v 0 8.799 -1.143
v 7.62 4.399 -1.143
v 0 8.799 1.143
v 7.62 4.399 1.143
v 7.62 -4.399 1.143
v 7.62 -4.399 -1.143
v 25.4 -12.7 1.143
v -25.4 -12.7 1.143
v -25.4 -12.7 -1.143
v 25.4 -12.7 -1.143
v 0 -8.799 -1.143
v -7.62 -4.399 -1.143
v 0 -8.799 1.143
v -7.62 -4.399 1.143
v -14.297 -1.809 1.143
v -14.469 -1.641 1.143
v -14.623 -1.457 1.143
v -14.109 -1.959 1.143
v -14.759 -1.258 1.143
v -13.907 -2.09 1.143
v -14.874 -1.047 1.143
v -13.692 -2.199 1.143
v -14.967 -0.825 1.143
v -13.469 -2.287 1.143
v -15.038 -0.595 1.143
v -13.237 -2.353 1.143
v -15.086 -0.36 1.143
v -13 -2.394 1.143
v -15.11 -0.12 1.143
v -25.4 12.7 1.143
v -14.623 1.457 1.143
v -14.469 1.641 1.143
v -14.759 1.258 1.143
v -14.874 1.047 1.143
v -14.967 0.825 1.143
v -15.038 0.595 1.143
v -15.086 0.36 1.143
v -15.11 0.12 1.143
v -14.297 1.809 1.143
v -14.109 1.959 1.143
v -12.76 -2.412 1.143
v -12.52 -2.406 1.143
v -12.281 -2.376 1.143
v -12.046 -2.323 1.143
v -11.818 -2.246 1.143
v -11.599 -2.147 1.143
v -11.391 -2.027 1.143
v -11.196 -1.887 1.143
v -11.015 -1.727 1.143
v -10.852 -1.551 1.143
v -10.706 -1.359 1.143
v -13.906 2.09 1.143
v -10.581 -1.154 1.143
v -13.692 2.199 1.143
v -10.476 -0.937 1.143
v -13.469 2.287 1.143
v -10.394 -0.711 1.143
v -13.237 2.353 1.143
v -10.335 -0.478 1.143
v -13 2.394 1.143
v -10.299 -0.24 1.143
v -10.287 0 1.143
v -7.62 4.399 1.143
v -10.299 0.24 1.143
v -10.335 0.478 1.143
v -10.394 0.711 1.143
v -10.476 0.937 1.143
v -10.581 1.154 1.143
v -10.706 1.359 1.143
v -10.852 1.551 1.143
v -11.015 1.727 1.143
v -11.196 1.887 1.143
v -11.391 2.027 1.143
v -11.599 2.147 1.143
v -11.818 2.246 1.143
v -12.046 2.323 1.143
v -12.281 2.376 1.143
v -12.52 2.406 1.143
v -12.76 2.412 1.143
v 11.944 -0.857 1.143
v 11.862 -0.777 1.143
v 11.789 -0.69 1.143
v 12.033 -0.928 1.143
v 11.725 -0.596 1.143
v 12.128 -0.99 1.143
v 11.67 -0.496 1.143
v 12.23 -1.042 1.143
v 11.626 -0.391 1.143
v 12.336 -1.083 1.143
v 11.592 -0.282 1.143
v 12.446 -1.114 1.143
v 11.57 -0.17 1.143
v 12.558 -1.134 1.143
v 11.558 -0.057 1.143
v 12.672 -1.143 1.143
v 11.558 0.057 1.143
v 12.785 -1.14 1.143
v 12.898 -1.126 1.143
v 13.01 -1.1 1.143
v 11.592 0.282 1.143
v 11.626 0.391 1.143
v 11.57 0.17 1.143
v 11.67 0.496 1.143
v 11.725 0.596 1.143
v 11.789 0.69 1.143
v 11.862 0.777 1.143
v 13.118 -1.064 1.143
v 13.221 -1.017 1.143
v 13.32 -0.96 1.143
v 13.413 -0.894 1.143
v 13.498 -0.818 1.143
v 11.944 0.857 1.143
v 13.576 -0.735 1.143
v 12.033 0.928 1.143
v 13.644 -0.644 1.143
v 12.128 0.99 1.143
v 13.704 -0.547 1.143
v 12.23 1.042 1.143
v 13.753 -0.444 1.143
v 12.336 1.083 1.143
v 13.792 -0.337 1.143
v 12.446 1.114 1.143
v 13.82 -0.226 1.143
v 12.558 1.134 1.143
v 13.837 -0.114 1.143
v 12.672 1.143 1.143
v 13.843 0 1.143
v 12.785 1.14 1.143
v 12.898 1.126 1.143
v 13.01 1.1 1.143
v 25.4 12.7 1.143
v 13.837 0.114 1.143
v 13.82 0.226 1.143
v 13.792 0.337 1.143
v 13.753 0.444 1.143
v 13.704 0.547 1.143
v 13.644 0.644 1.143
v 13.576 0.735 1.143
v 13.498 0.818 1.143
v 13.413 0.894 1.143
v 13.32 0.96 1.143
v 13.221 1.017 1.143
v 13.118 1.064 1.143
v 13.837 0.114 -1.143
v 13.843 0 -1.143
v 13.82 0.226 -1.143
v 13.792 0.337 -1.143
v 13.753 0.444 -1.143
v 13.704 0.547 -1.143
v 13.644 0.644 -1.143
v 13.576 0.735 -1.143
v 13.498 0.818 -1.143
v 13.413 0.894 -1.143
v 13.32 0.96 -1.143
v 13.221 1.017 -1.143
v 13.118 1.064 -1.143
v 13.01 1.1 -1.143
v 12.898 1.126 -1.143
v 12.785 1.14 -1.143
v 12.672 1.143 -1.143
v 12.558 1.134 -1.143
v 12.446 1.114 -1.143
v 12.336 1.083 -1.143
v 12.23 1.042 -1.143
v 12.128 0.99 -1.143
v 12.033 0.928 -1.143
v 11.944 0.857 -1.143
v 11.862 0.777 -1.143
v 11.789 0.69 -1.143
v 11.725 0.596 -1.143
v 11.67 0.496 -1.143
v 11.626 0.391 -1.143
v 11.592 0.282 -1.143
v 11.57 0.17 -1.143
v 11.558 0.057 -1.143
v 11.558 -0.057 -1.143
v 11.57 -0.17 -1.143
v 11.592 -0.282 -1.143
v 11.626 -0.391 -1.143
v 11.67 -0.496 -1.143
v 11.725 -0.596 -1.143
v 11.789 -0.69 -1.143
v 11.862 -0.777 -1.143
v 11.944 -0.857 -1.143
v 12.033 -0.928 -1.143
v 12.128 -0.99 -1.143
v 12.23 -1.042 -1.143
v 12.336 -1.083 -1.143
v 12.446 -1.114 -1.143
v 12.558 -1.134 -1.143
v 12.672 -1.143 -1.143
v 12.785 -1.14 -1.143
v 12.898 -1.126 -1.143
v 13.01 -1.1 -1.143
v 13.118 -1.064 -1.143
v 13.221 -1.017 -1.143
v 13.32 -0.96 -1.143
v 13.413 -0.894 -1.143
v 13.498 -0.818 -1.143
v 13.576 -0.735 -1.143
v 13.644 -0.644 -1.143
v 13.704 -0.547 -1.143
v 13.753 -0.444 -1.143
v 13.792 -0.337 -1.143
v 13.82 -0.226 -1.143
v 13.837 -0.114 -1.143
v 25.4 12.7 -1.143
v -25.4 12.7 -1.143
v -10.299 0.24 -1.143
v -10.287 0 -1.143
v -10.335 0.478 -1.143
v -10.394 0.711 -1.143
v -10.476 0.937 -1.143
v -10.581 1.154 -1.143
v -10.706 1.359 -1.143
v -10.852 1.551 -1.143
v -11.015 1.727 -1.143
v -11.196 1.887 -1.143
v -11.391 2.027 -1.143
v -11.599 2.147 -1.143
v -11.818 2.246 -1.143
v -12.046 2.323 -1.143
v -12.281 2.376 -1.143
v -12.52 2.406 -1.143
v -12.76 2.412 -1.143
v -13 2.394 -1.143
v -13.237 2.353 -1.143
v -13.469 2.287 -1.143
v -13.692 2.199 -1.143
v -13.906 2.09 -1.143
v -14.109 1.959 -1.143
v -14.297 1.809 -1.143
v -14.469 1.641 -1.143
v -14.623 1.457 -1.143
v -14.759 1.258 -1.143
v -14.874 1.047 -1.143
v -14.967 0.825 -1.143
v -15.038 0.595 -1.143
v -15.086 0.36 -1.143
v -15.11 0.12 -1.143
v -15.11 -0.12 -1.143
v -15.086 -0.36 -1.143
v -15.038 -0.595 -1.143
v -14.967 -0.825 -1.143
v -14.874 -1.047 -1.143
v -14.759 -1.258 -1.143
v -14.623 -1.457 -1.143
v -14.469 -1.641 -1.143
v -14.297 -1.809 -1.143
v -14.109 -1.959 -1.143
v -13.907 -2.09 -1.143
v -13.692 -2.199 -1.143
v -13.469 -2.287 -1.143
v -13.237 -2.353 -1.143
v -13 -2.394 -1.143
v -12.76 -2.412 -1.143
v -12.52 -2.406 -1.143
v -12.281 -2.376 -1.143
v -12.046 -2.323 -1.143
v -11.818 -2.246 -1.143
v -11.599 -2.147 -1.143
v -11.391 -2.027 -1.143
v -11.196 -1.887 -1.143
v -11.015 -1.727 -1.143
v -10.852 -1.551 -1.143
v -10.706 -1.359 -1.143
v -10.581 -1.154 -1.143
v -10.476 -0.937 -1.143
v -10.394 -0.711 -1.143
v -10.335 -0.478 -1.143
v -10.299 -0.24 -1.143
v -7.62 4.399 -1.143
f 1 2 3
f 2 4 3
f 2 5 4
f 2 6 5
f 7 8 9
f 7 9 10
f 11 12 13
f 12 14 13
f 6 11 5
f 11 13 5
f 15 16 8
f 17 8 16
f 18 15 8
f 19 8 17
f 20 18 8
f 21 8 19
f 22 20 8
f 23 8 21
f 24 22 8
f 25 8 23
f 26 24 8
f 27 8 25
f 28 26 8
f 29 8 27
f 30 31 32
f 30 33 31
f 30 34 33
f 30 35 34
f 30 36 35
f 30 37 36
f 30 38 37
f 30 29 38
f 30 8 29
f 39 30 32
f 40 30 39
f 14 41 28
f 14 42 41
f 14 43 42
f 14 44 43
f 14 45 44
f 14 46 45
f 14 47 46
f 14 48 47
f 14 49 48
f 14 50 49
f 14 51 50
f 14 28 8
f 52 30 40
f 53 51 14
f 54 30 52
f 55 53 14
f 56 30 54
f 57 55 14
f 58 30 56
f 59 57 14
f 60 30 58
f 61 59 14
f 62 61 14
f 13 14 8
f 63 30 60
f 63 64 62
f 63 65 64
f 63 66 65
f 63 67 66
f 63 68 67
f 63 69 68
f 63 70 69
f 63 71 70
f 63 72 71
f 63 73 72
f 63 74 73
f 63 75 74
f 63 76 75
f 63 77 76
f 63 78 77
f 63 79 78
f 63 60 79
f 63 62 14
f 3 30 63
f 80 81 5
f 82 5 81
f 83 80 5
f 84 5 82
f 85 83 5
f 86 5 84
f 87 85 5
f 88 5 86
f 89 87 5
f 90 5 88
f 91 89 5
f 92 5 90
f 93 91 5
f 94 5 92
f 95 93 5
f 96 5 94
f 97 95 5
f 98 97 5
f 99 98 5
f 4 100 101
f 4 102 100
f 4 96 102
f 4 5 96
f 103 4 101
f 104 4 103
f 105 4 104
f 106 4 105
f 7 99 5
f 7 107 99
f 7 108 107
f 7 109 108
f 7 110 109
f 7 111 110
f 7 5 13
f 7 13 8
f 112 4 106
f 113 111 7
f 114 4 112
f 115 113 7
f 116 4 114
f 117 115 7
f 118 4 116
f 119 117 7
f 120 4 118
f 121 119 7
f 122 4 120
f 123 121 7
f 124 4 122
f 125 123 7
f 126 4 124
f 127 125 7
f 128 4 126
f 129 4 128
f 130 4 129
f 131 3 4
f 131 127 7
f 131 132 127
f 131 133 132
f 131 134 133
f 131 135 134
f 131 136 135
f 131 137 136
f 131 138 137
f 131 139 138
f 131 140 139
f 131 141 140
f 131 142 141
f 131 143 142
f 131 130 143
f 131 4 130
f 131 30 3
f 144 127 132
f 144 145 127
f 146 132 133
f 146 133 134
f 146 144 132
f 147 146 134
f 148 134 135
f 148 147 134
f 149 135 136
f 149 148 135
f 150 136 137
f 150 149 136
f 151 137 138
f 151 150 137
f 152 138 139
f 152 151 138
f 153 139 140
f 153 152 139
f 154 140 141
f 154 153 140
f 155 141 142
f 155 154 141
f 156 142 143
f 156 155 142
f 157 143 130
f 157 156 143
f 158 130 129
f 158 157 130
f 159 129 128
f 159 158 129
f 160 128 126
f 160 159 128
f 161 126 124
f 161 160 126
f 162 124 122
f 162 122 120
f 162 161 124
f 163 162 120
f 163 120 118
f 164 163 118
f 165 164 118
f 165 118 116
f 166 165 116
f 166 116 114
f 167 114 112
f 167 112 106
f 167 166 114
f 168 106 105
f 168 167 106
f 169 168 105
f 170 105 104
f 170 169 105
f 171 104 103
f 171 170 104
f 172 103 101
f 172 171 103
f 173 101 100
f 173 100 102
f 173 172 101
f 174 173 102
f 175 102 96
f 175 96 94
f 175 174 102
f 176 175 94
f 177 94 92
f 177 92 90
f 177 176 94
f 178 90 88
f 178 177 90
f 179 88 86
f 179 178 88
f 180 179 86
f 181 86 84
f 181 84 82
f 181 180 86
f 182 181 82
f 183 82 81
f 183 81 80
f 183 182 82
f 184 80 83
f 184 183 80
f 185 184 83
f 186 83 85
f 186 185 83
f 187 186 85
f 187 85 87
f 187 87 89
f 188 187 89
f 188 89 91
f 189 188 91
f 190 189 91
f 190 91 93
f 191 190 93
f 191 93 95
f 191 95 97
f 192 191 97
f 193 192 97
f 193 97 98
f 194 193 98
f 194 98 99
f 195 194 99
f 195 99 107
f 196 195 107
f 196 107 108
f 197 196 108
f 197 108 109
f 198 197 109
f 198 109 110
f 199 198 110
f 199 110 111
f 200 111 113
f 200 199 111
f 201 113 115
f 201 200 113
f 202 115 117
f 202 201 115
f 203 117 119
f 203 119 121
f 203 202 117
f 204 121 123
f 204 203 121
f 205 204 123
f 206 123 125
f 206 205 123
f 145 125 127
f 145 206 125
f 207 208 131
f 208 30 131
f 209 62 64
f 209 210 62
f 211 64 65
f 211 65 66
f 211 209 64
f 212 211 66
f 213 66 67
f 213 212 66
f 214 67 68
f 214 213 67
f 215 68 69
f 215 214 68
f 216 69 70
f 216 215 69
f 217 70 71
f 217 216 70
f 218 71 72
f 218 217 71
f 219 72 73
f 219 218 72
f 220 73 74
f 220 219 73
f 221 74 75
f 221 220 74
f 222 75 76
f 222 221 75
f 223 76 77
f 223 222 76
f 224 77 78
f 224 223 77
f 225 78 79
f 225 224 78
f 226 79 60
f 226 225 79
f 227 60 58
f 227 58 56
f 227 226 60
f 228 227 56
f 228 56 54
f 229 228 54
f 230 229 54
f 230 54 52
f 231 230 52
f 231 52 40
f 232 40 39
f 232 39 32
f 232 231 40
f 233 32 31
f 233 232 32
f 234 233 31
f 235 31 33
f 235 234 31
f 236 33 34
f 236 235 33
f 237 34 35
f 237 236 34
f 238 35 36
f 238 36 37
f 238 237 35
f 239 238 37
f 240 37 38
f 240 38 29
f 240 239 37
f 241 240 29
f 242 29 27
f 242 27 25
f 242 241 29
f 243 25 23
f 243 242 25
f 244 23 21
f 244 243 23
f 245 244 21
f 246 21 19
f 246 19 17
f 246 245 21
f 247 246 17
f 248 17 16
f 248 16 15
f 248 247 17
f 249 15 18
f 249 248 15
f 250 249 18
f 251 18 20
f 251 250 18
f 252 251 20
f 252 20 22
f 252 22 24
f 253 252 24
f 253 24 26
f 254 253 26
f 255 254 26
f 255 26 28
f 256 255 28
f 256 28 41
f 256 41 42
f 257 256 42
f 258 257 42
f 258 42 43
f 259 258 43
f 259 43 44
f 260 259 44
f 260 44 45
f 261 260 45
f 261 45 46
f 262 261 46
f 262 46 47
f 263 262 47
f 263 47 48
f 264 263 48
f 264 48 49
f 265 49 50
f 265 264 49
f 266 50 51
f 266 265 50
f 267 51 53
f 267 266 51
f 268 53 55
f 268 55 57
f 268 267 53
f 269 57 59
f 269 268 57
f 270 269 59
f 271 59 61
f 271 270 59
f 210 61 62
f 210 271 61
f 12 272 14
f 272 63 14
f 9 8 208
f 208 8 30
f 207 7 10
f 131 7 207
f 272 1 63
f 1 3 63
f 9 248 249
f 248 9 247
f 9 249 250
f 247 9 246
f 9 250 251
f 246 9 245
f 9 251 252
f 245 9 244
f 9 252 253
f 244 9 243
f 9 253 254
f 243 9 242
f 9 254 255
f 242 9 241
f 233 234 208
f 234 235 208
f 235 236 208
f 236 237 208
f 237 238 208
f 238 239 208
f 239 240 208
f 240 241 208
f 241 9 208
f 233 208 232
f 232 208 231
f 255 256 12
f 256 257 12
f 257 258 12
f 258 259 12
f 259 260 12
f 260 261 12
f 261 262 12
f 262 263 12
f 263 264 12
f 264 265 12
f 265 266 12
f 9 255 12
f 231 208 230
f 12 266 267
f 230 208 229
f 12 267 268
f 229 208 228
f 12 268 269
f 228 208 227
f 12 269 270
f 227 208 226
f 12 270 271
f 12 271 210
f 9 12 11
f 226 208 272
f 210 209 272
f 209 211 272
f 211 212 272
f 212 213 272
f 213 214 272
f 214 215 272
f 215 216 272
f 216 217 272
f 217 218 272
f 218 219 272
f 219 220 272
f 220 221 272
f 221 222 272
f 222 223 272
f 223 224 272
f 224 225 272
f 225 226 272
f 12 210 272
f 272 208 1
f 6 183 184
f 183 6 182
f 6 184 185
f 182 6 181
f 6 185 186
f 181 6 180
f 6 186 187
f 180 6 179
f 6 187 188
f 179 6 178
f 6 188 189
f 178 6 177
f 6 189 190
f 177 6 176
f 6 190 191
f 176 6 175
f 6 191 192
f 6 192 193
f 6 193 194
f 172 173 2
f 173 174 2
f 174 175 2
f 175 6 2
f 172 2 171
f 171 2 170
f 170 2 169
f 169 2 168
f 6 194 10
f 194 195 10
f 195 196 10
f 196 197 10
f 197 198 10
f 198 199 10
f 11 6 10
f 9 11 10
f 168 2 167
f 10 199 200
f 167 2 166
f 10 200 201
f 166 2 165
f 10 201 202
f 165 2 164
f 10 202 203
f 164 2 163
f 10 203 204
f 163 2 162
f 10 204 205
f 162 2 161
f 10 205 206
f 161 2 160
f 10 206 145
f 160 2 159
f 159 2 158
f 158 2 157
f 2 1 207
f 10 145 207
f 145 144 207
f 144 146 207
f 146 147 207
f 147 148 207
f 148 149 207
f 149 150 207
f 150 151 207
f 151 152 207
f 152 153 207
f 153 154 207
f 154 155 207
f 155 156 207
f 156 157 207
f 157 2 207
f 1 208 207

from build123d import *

# Parameters (mm, degrees)
SKETCH1_W           = 50.8
SKETCH1_H           = 25.4
SKETCH1_R           = 2.413
SKETCH1_R_2         = 1.143
BOSS_EXTRUDE1_DEPTH = 1.143


with BuildPart() as part:
    # Sketch1 → Boss-Extrude1 (new, symmetric)
    with BuildSketch(Plane.XY):
        Rectangle(SKETCH1_W, SKETCH1_H)
        with Locations((-12.7, 0)):
            Circle(SKETCH1_R, mode=Mode.SUBTRACT)
        with Locations((12.7, 0)):
            Circle(SKETCH1_R_2, mode=Mode.SUBTRACT)
        Polygon((7.62, 4.399409051), (0, 8.798818102), (-7.62, 4.399409051), (-7.62, -4.399409051), (0, -8.798818102), (7.62, -4.399409051), align=None, mode=Mode.SUBTRACT)
    extrude(amount=BOSS_EXTRUDE1_DEPTH, both=True)


solid = part.part
